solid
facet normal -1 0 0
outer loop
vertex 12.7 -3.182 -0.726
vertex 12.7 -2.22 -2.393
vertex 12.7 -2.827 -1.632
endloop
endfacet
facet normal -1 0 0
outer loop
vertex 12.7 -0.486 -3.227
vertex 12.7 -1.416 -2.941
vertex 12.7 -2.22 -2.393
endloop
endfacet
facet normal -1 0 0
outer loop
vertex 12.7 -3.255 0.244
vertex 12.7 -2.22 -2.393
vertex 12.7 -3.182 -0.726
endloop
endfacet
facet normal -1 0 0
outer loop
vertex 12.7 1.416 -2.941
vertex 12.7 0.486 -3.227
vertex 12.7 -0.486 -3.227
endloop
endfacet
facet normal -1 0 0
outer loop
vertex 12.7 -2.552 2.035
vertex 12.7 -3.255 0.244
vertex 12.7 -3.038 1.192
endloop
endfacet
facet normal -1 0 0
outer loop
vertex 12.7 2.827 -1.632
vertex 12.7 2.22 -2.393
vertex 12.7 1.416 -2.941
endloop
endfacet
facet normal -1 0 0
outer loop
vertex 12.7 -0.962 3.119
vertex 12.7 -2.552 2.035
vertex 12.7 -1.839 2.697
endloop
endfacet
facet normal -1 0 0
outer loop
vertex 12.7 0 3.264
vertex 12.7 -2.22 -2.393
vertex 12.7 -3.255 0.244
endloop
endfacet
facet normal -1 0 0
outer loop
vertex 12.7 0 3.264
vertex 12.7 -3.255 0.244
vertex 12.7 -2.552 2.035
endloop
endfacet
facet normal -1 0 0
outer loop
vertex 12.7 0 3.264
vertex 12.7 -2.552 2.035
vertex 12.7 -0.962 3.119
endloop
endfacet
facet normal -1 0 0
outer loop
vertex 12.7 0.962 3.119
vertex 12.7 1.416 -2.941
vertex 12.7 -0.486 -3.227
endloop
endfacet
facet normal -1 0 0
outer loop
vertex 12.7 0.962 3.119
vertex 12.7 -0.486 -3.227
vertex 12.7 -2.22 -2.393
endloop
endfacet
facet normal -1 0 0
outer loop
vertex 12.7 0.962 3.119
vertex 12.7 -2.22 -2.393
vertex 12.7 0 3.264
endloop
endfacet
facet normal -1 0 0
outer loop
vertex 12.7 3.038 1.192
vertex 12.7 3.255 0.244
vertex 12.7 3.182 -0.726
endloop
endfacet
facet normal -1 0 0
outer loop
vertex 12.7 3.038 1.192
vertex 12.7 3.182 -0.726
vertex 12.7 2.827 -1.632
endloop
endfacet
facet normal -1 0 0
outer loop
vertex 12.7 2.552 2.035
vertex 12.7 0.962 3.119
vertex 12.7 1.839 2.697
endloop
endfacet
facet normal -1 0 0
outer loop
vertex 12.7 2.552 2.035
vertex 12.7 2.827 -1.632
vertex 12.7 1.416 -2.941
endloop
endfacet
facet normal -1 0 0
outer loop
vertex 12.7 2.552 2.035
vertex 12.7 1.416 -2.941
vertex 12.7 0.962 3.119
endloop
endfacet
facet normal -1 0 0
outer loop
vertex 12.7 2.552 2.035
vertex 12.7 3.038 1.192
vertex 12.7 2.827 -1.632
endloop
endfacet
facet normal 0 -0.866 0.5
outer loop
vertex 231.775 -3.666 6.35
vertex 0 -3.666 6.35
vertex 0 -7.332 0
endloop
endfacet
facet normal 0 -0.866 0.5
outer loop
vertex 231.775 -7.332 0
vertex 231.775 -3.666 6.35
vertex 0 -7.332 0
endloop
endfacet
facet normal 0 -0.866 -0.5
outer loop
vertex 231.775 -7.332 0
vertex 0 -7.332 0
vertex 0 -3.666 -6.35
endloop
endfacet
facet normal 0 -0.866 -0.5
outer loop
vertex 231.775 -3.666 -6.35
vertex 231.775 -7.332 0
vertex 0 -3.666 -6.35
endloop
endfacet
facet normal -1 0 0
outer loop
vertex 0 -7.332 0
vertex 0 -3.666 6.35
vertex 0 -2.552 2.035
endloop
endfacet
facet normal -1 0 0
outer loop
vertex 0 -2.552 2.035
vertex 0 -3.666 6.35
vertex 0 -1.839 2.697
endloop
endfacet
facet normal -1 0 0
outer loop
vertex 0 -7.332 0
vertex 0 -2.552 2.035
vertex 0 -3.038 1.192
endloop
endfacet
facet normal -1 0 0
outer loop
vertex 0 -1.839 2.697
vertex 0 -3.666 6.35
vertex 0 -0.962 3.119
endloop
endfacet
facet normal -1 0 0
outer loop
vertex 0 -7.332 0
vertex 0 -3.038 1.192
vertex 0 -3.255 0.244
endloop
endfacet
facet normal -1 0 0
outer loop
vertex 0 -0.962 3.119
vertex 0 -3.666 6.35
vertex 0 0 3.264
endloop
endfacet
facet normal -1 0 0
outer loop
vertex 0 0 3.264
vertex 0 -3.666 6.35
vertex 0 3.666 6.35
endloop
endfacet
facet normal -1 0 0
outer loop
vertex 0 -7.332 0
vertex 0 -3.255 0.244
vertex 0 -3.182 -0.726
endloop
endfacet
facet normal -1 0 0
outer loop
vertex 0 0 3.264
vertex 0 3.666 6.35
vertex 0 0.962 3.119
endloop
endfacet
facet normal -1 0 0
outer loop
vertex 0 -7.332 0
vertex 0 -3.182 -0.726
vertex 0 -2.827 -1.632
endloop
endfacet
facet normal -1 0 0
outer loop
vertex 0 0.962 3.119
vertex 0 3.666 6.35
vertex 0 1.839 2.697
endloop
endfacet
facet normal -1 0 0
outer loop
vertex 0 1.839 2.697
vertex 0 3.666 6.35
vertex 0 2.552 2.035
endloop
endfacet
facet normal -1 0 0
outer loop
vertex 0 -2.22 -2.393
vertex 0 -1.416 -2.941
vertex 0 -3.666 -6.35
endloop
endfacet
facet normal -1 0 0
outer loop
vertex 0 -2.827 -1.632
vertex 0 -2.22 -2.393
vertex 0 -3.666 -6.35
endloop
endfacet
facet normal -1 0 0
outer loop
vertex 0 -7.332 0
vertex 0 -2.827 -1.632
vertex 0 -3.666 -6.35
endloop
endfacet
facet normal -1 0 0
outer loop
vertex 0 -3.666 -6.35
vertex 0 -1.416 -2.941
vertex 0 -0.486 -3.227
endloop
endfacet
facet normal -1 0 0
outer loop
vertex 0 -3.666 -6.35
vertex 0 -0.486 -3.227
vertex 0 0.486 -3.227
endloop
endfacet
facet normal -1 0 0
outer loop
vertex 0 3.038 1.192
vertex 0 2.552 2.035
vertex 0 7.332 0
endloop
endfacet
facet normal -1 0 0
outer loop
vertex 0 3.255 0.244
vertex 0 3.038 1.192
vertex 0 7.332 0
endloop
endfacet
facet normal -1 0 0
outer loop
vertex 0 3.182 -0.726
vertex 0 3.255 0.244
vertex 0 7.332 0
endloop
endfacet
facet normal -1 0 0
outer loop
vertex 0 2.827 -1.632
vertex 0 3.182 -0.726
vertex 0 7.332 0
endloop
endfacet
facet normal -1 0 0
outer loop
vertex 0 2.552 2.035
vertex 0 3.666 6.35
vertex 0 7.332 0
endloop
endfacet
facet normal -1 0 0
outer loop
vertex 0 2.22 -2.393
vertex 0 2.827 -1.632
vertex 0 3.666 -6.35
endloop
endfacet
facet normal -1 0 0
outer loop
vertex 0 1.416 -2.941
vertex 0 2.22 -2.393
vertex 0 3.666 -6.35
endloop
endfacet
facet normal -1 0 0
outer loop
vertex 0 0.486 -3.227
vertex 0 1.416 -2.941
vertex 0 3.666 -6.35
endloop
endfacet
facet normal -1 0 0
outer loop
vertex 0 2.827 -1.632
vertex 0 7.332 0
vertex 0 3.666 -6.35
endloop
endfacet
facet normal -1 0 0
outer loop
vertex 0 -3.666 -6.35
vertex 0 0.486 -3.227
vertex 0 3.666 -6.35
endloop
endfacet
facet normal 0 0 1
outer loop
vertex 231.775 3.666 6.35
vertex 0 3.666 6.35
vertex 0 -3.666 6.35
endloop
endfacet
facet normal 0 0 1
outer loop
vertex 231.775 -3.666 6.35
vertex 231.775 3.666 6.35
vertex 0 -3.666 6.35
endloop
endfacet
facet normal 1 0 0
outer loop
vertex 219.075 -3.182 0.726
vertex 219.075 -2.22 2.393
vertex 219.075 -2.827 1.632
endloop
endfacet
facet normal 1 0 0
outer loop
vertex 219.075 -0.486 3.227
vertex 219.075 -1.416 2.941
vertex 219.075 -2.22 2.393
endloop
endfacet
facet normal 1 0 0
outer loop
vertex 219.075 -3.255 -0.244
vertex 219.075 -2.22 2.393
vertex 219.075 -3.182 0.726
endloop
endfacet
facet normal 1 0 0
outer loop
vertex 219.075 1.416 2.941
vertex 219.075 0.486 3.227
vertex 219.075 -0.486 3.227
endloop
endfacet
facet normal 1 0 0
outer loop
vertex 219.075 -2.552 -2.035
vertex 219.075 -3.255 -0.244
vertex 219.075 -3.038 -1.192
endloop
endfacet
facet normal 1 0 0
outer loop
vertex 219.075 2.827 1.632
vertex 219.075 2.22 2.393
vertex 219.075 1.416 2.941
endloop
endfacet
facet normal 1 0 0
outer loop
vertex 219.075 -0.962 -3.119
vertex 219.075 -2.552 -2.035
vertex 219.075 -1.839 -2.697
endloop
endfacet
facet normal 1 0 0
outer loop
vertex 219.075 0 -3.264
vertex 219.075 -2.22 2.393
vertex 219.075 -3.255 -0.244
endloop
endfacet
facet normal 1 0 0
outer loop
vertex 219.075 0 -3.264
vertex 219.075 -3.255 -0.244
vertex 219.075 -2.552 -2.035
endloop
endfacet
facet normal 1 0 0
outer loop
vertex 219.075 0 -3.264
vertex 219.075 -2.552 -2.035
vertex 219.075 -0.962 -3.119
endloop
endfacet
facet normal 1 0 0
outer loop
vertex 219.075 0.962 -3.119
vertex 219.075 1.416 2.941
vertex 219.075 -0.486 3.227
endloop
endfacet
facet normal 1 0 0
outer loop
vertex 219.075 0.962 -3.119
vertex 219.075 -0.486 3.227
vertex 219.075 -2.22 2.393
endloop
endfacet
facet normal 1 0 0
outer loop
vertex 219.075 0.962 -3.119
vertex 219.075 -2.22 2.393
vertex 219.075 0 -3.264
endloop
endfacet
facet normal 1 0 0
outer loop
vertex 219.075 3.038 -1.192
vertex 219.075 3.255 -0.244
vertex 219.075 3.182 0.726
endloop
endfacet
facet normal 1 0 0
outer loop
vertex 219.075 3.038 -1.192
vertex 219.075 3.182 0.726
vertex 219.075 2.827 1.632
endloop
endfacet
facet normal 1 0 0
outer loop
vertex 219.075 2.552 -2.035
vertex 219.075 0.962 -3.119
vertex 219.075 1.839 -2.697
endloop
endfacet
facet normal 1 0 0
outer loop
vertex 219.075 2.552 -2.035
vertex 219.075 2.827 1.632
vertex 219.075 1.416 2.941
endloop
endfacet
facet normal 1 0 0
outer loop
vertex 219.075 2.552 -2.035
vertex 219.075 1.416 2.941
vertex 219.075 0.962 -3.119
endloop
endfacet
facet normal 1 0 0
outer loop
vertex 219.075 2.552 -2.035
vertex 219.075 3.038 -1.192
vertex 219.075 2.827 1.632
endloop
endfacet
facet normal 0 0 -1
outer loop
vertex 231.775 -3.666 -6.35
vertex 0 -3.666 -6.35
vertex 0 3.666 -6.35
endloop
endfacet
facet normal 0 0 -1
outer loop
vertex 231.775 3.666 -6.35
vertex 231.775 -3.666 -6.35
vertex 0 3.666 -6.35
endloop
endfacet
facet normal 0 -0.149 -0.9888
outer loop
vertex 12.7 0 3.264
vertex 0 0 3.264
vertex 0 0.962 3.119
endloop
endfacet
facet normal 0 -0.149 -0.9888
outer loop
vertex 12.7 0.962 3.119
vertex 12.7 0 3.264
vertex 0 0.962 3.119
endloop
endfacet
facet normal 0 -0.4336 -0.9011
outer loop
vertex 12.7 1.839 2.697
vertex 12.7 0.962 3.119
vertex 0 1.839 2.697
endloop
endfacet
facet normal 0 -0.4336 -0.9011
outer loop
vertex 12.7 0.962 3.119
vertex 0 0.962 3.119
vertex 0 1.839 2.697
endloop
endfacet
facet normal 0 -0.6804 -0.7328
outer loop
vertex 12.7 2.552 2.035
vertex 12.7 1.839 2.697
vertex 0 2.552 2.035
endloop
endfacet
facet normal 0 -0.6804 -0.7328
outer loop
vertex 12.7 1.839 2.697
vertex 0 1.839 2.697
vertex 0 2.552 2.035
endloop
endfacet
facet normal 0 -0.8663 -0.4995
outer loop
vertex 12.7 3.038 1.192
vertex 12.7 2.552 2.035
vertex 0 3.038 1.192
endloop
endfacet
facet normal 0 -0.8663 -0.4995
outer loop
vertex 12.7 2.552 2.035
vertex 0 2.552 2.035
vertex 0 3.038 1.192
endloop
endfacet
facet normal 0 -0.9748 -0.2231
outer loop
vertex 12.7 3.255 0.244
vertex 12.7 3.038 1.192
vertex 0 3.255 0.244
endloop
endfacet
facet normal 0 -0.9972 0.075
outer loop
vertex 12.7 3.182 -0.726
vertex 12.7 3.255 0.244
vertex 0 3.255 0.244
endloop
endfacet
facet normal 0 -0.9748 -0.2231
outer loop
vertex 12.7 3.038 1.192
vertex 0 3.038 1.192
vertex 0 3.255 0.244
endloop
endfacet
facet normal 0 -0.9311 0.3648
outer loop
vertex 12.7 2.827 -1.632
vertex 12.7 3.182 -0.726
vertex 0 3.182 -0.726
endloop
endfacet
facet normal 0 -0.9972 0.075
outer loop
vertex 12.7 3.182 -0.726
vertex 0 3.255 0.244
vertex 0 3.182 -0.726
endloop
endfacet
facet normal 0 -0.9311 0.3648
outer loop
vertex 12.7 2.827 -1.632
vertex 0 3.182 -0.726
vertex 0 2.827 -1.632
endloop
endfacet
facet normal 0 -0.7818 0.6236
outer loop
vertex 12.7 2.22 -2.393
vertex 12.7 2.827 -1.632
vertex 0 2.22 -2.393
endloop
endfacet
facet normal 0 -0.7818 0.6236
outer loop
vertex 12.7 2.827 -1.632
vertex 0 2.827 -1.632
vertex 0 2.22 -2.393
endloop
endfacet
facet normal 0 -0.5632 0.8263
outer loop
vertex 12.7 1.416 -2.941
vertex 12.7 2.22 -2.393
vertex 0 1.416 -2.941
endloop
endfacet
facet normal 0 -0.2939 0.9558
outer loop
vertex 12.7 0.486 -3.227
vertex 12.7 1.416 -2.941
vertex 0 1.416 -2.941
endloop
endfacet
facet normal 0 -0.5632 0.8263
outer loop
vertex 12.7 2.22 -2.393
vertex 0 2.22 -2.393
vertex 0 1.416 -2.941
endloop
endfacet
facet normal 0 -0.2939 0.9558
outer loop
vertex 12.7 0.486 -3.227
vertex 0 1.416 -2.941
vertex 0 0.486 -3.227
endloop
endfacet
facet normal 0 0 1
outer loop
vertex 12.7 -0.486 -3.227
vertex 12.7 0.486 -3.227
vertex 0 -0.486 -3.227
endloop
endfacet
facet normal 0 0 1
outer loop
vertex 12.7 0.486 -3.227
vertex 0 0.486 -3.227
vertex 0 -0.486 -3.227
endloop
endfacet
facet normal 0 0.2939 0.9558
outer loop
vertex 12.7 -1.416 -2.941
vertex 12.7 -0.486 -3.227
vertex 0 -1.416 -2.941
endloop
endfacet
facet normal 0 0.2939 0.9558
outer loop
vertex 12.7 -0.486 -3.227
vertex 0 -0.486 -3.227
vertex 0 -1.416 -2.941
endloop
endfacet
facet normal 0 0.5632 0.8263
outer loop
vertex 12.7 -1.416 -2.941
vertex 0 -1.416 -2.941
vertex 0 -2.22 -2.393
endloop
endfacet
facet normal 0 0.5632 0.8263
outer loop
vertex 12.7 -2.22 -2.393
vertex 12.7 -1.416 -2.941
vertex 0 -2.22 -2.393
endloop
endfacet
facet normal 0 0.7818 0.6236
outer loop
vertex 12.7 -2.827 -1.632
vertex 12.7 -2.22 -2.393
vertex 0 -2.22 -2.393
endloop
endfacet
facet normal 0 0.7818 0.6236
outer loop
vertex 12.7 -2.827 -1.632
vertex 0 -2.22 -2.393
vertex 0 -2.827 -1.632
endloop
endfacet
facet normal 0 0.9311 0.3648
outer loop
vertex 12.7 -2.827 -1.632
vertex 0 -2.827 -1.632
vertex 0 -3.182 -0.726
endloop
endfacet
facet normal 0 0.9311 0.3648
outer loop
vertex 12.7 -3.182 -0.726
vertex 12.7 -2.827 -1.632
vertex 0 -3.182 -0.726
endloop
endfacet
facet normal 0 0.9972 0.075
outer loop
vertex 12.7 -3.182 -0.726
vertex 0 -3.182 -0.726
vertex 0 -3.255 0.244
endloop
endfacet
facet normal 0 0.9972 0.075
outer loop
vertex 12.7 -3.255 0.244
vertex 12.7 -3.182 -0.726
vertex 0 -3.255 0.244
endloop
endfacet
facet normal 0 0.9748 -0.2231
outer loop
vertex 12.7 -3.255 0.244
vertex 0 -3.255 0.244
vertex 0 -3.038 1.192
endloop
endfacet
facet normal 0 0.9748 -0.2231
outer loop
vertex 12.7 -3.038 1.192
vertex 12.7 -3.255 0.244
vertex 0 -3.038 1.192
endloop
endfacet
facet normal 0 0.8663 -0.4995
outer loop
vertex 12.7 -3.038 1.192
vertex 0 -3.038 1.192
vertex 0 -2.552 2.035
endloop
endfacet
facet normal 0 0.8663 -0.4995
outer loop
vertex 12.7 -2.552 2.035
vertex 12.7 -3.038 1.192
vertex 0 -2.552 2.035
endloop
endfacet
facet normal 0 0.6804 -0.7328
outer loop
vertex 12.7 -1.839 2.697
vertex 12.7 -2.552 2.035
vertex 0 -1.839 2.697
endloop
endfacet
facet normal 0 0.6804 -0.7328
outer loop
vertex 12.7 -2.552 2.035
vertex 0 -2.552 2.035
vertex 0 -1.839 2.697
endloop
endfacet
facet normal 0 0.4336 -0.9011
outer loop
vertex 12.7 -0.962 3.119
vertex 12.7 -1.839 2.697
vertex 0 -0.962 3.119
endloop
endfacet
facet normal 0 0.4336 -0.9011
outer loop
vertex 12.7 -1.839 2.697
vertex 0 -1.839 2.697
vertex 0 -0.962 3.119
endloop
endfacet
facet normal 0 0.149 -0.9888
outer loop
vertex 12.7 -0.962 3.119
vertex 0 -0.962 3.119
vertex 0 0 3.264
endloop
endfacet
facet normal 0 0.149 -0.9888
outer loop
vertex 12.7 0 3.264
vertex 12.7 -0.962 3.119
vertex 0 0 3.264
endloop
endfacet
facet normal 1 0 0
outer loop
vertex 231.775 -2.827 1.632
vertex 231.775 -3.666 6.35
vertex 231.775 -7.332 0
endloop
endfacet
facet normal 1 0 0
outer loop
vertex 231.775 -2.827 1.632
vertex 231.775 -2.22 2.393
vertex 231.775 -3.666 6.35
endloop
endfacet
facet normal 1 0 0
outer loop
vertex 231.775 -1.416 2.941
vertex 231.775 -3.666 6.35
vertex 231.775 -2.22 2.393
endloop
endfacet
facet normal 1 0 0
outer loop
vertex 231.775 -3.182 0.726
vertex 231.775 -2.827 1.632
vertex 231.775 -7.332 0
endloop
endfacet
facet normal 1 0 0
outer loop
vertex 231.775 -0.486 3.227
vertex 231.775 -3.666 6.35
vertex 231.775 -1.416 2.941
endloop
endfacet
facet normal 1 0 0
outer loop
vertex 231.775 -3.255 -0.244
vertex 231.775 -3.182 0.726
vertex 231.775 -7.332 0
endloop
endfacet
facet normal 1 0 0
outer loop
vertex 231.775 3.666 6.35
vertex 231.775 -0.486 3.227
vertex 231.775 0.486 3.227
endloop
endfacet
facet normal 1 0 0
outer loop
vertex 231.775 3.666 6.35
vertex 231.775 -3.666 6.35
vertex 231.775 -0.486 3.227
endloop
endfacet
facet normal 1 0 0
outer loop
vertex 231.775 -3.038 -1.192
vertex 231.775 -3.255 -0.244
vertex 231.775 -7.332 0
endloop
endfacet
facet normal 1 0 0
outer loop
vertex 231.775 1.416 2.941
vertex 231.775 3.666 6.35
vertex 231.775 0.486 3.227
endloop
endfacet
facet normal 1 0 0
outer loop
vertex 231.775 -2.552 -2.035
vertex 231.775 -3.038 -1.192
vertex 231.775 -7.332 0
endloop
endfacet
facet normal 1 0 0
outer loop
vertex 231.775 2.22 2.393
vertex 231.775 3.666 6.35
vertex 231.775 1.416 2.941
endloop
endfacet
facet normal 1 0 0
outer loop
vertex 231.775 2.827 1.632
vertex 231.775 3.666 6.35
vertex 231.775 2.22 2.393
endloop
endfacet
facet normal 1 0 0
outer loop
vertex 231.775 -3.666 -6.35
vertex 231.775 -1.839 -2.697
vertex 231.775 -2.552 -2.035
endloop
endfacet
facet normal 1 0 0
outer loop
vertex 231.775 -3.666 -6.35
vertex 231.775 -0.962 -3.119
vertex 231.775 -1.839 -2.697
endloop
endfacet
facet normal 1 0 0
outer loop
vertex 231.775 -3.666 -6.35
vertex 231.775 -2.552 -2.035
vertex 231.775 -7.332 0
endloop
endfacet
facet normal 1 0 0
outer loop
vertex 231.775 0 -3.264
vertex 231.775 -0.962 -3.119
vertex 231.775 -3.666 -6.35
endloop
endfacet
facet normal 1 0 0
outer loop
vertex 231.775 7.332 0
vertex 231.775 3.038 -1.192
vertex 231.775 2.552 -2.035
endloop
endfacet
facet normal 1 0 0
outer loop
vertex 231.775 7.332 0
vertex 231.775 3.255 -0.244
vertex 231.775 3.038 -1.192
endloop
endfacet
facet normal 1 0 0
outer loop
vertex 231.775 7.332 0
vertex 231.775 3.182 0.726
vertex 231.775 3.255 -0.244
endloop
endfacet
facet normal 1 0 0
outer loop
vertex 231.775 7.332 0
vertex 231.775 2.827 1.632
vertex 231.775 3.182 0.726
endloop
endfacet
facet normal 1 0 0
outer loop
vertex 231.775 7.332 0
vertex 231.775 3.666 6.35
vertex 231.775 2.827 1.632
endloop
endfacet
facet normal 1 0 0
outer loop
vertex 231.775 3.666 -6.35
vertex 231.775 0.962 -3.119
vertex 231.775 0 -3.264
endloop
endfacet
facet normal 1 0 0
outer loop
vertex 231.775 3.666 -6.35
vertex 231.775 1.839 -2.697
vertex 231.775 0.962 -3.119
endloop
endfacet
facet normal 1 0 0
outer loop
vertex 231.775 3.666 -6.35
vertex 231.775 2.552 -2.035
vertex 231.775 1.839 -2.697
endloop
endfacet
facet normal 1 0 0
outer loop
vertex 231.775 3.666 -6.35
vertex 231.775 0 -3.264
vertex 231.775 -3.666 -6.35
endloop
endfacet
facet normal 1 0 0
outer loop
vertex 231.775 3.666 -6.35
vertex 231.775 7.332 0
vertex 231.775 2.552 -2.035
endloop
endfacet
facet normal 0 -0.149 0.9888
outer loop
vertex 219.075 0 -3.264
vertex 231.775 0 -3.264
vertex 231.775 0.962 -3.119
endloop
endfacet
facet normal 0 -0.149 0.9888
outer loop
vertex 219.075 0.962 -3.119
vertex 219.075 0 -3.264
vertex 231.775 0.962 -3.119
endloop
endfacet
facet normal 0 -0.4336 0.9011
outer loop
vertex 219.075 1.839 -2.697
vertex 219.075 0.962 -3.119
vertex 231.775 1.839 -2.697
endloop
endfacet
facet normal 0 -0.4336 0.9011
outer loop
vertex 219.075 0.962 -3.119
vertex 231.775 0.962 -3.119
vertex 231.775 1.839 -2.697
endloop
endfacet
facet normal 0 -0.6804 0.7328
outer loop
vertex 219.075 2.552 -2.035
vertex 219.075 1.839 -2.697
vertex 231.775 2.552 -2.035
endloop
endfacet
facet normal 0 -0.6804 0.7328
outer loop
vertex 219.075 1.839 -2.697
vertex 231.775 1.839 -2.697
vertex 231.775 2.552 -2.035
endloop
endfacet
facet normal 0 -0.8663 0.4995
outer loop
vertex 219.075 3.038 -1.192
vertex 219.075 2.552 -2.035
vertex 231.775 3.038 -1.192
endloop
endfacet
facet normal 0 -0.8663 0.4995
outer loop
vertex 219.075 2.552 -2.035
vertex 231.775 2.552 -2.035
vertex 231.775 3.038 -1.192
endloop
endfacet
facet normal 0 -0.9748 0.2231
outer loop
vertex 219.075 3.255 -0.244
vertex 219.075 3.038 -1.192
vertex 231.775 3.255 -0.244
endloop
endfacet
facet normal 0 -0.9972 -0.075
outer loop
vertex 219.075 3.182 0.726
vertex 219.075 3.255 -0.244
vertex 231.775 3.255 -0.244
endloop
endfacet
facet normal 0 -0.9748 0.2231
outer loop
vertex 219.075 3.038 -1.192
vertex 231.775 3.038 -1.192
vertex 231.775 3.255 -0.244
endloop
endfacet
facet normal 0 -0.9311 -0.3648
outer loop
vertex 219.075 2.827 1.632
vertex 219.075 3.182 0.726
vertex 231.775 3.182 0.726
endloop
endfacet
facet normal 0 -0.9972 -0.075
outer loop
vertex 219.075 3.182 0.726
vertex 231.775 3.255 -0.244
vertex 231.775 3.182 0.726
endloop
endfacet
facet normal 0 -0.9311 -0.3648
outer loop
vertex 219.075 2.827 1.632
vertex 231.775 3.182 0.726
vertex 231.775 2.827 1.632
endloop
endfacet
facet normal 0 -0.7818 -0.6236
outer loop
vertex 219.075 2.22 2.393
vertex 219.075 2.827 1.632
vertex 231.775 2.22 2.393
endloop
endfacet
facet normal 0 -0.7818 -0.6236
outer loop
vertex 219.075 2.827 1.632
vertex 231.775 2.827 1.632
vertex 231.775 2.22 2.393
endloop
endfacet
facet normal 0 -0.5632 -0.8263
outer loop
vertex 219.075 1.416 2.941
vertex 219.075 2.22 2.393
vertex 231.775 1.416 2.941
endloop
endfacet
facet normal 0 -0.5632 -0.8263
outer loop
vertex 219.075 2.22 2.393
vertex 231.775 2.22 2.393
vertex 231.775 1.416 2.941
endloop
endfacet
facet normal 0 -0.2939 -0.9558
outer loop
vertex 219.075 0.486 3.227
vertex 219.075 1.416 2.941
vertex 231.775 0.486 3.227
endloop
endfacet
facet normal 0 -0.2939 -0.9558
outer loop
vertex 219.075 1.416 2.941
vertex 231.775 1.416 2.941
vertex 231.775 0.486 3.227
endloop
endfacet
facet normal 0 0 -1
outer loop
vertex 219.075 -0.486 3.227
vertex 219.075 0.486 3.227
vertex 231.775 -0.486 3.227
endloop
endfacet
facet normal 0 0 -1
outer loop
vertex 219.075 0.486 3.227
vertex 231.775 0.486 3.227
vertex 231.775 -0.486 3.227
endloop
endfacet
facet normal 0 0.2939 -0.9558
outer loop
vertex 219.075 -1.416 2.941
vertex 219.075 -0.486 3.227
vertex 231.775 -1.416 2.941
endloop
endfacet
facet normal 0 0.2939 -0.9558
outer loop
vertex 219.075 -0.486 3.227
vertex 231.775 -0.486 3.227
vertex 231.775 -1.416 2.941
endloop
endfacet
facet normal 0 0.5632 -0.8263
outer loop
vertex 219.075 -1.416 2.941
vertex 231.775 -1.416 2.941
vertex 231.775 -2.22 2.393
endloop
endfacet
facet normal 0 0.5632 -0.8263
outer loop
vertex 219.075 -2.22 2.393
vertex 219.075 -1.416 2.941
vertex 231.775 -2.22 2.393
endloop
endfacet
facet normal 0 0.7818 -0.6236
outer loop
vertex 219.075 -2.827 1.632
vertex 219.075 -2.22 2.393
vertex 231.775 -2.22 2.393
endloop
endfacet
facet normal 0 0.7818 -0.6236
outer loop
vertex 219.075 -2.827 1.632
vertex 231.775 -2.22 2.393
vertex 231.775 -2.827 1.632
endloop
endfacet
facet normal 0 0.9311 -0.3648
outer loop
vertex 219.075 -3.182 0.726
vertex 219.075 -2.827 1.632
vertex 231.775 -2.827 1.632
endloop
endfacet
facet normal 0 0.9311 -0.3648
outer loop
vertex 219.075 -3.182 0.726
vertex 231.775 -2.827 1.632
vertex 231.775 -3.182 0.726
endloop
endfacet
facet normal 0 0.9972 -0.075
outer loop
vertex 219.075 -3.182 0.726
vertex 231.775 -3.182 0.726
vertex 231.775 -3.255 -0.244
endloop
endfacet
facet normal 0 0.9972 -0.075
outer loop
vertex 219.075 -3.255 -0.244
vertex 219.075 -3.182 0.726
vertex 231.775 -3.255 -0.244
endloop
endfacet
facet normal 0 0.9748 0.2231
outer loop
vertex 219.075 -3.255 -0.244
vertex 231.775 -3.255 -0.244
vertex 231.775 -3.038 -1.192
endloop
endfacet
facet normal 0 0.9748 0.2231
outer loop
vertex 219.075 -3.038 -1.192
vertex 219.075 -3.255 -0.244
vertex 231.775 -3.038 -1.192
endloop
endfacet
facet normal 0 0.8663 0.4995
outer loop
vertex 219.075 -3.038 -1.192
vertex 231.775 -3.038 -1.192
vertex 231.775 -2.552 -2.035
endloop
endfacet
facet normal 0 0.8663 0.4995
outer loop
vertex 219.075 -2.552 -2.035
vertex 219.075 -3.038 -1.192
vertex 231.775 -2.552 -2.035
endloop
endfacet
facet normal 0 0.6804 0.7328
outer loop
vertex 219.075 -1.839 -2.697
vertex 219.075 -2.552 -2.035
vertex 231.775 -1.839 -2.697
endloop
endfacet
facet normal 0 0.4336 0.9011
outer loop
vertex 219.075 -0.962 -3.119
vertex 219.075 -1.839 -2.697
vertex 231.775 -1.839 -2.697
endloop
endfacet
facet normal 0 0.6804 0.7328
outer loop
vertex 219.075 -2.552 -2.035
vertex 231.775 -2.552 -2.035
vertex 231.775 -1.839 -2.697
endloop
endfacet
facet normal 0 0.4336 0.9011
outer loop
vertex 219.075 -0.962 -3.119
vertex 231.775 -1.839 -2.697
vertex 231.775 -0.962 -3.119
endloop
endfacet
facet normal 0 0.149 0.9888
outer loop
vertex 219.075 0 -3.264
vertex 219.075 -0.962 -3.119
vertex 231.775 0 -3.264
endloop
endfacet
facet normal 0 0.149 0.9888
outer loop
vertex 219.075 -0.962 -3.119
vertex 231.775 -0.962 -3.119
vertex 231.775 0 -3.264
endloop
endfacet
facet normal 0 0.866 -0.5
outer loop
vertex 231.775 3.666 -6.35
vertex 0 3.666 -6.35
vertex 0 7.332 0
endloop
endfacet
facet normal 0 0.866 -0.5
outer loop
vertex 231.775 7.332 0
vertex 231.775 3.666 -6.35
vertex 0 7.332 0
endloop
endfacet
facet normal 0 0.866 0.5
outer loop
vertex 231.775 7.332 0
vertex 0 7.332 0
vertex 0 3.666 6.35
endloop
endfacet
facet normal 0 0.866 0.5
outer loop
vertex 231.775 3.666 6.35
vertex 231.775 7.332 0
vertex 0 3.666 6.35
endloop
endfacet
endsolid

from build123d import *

# Parameters (mm, degrees)
BOSS_EXTRUDE1_DEPTH = 231.775
SKETCH2_R           = 3.2639
CUT_EXTRUDE1_DEPTH  = 12.7
SKETCH3_R           = 3.2639
CUT_EXTRUDE2_DEPTH  = 12.7


with BuildPart() as part:
    # Sketch1 → Boss-Extrude1 (new body)
    with BuildSketch(Plane(origin=(0, 0, 0), x_dir=(0, 0, -1), z_dir=(1, 0, 0))):
        Polygon((0, 7.332348419), (-6.35, 3.666174209), (-6.35, -3.666174209), (0, -7.332348419), (6.35, -3.666174209), (6.35, 3.666174209), align=None)
    extrude(amount=BOSS_EXTRUDE1_DEPTH)

    # Sketch2 → Cut-Extrude1 (cut)
    with BuildSketch(Plane(origin=(231.775, 0, 0), x_dir=(0, 0, -1), z_dir=(1, 0, 0))):
        Circle(SKETCH2_R)
    extrude(amount=-CUT_EXTRUDE1_DEPTH, mode=Mode.SUBTRACT)

    # Sketch3 → Cut-Extrude2 (cut)
    with BuildSketch(Plane.ZY):
        Circle(SKETCH3_R)
    extrude(amount=-CUT_EXTRUDE2_DEPTH, mode=Mode.SUBTRACT)


solid = part.part
